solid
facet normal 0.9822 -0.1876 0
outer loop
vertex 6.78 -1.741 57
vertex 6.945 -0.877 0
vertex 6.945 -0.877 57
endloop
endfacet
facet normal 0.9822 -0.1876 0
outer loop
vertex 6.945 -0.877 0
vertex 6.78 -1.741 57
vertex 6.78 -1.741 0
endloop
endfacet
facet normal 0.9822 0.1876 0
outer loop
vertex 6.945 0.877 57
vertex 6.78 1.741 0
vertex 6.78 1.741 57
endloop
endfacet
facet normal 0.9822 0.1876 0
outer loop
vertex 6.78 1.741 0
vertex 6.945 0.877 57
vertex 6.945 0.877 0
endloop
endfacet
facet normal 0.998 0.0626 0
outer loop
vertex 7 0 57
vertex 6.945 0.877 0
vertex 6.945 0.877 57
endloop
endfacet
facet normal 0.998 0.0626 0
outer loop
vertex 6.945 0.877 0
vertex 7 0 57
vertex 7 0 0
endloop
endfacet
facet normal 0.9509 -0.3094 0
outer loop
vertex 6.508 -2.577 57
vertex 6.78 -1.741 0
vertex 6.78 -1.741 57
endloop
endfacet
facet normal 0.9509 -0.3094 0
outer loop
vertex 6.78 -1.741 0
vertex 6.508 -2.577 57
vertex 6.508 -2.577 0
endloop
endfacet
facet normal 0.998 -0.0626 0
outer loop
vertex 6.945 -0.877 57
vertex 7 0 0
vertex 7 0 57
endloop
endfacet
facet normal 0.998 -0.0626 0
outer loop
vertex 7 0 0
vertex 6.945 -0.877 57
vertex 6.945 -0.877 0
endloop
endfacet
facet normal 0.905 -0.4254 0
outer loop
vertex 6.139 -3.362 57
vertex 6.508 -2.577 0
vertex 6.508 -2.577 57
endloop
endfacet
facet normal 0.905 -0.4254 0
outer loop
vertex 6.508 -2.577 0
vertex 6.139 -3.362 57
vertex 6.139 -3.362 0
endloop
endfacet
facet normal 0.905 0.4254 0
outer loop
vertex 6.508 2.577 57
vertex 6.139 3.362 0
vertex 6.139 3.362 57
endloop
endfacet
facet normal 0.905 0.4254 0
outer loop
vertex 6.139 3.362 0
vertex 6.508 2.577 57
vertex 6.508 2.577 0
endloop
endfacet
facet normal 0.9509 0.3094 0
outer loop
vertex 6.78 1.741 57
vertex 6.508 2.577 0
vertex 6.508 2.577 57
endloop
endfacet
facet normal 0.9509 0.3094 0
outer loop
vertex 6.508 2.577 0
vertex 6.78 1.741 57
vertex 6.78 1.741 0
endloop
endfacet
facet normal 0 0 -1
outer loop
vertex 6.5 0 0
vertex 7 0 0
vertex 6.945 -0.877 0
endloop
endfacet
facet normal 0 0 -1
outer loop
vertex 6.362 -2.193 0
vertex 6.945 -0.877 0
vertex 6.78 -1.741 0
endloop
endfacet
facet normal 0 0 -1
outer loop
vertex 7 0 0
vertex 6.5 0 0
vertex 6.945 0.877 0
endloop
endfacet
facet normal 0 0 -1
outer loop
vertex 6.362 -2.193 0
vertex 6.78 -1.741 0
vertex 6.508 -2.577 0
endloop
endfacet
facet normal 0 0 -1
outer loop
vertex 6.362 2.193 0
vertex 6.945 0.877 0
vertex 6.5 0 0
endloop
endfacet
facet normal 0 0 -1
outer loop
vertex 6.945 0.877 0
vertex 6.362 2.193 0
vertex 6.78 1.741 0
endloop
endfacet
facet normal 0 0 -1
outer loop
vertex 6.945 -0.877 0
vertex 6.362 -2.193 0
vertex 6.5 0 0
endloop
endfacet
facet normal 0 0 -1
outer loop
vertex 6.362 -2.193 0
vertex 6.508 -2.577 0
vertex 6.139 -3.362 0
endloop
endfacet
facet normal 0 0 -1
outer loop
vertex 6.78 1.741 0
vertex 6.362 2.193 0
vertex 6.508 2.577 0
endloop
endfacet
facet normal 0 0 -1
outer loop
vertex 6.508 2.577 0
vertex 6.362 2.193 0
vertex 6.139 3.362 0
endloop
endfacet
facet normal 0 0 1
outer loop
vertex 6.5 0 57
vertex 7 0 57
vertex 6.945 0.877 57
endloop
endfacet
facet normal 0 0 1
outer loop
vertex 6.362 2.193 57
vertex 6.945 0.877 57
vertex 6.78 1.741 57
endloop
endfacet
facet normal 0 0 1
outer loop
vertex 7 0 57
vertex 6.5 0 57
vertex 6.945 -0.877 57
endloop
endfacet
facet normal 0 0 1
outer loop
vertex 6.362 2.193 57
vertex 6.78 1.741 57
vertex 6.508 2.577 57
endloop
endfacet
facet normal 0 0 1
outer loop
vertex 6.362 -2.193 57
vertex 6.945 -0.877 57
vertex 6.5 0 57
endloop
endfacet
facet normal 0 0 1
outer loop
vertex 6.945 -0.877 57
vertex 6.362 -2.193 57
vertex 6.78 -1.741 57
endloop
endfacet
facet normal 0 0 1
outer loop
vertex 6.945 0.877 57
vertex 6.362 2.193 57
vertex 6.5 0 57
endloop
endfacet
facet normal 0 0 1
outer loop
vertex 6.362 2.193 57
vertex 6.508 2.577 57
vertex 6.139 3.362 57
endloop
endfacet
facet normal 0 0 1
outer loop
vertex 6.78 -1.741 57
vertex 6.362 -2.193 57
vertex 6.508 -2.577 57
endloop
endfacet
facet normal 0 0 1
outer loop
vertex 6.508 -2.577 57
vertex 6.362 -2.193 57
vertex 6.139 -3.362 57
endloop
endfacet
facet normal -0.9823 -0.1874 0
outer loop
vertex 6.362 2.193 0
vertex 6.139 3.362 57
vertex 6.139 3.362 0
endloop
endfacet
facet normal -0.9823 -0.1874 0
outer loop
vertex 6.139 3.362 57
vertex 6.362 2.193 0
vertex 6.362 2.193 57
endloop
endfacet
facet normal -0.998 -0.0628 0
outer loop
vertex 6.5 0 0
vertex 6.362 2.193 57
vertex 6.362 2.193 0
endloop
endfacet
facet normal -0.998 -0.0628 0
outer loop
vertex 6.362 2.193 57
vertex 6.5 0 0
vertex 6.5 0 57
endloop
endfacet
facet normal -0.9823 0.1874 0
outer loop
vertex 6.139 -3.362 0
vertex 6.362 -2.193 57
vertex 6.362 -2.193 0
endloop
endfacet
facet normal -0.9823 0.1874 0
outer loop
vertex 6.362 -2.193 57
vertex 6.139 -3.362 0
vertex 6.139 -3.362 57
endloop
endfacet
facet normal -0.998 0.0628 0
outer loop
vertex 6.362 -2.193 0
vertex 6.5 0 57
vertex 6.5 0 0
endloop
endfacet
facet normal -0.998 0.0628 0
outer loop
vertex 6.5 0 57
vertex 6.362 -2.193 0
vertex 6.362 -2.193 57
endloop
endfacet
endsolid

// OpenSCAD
$fn = 50;


difference() {
	union() {
		cylinder(h = 57, r = 7.0000000000);
		translate(v = [-14.0000000000, 0, 0]) {
			cylinder(h = 57, r = 7.0000000000);
		}
	}
	union() {
		cylinder(h = 57, r = 3.2500000000);
		cylinder(h = 57, r = 1.8000000000);
		cylinder(h = 57, r = 1.8000000000);
		cylinder(h = 57, r = 1.8000000000);
		translate(v = [-18.5000000000, 0, 0]) {
			hull() {
				translate(v = [-3.7500000000, 0.0000000000, 0]) {
					cylinder(h = 57, r = 7.5000000000);
				}
				translate(v = [3.7500000000, 0.0000000000, 0]) {
					cylinder(h = 57, r = 7.5000000000);
				}
				translate(v = [-3.7500000000, -0.0000000000, 0]) {
					cylinder(h = 57, r = 7.5000000000);
				}
				translate(v = [3.7500000000, -0.0000000000, 0]) {
					cylinder(h = 57, r = 7.5000000000);
				}
			}
		}
		translate(v = [-11.0000000000, 0, 0.0000000000]) {
			cylinder(h = 57, r = 17.5000000000);
		}
	}
}
